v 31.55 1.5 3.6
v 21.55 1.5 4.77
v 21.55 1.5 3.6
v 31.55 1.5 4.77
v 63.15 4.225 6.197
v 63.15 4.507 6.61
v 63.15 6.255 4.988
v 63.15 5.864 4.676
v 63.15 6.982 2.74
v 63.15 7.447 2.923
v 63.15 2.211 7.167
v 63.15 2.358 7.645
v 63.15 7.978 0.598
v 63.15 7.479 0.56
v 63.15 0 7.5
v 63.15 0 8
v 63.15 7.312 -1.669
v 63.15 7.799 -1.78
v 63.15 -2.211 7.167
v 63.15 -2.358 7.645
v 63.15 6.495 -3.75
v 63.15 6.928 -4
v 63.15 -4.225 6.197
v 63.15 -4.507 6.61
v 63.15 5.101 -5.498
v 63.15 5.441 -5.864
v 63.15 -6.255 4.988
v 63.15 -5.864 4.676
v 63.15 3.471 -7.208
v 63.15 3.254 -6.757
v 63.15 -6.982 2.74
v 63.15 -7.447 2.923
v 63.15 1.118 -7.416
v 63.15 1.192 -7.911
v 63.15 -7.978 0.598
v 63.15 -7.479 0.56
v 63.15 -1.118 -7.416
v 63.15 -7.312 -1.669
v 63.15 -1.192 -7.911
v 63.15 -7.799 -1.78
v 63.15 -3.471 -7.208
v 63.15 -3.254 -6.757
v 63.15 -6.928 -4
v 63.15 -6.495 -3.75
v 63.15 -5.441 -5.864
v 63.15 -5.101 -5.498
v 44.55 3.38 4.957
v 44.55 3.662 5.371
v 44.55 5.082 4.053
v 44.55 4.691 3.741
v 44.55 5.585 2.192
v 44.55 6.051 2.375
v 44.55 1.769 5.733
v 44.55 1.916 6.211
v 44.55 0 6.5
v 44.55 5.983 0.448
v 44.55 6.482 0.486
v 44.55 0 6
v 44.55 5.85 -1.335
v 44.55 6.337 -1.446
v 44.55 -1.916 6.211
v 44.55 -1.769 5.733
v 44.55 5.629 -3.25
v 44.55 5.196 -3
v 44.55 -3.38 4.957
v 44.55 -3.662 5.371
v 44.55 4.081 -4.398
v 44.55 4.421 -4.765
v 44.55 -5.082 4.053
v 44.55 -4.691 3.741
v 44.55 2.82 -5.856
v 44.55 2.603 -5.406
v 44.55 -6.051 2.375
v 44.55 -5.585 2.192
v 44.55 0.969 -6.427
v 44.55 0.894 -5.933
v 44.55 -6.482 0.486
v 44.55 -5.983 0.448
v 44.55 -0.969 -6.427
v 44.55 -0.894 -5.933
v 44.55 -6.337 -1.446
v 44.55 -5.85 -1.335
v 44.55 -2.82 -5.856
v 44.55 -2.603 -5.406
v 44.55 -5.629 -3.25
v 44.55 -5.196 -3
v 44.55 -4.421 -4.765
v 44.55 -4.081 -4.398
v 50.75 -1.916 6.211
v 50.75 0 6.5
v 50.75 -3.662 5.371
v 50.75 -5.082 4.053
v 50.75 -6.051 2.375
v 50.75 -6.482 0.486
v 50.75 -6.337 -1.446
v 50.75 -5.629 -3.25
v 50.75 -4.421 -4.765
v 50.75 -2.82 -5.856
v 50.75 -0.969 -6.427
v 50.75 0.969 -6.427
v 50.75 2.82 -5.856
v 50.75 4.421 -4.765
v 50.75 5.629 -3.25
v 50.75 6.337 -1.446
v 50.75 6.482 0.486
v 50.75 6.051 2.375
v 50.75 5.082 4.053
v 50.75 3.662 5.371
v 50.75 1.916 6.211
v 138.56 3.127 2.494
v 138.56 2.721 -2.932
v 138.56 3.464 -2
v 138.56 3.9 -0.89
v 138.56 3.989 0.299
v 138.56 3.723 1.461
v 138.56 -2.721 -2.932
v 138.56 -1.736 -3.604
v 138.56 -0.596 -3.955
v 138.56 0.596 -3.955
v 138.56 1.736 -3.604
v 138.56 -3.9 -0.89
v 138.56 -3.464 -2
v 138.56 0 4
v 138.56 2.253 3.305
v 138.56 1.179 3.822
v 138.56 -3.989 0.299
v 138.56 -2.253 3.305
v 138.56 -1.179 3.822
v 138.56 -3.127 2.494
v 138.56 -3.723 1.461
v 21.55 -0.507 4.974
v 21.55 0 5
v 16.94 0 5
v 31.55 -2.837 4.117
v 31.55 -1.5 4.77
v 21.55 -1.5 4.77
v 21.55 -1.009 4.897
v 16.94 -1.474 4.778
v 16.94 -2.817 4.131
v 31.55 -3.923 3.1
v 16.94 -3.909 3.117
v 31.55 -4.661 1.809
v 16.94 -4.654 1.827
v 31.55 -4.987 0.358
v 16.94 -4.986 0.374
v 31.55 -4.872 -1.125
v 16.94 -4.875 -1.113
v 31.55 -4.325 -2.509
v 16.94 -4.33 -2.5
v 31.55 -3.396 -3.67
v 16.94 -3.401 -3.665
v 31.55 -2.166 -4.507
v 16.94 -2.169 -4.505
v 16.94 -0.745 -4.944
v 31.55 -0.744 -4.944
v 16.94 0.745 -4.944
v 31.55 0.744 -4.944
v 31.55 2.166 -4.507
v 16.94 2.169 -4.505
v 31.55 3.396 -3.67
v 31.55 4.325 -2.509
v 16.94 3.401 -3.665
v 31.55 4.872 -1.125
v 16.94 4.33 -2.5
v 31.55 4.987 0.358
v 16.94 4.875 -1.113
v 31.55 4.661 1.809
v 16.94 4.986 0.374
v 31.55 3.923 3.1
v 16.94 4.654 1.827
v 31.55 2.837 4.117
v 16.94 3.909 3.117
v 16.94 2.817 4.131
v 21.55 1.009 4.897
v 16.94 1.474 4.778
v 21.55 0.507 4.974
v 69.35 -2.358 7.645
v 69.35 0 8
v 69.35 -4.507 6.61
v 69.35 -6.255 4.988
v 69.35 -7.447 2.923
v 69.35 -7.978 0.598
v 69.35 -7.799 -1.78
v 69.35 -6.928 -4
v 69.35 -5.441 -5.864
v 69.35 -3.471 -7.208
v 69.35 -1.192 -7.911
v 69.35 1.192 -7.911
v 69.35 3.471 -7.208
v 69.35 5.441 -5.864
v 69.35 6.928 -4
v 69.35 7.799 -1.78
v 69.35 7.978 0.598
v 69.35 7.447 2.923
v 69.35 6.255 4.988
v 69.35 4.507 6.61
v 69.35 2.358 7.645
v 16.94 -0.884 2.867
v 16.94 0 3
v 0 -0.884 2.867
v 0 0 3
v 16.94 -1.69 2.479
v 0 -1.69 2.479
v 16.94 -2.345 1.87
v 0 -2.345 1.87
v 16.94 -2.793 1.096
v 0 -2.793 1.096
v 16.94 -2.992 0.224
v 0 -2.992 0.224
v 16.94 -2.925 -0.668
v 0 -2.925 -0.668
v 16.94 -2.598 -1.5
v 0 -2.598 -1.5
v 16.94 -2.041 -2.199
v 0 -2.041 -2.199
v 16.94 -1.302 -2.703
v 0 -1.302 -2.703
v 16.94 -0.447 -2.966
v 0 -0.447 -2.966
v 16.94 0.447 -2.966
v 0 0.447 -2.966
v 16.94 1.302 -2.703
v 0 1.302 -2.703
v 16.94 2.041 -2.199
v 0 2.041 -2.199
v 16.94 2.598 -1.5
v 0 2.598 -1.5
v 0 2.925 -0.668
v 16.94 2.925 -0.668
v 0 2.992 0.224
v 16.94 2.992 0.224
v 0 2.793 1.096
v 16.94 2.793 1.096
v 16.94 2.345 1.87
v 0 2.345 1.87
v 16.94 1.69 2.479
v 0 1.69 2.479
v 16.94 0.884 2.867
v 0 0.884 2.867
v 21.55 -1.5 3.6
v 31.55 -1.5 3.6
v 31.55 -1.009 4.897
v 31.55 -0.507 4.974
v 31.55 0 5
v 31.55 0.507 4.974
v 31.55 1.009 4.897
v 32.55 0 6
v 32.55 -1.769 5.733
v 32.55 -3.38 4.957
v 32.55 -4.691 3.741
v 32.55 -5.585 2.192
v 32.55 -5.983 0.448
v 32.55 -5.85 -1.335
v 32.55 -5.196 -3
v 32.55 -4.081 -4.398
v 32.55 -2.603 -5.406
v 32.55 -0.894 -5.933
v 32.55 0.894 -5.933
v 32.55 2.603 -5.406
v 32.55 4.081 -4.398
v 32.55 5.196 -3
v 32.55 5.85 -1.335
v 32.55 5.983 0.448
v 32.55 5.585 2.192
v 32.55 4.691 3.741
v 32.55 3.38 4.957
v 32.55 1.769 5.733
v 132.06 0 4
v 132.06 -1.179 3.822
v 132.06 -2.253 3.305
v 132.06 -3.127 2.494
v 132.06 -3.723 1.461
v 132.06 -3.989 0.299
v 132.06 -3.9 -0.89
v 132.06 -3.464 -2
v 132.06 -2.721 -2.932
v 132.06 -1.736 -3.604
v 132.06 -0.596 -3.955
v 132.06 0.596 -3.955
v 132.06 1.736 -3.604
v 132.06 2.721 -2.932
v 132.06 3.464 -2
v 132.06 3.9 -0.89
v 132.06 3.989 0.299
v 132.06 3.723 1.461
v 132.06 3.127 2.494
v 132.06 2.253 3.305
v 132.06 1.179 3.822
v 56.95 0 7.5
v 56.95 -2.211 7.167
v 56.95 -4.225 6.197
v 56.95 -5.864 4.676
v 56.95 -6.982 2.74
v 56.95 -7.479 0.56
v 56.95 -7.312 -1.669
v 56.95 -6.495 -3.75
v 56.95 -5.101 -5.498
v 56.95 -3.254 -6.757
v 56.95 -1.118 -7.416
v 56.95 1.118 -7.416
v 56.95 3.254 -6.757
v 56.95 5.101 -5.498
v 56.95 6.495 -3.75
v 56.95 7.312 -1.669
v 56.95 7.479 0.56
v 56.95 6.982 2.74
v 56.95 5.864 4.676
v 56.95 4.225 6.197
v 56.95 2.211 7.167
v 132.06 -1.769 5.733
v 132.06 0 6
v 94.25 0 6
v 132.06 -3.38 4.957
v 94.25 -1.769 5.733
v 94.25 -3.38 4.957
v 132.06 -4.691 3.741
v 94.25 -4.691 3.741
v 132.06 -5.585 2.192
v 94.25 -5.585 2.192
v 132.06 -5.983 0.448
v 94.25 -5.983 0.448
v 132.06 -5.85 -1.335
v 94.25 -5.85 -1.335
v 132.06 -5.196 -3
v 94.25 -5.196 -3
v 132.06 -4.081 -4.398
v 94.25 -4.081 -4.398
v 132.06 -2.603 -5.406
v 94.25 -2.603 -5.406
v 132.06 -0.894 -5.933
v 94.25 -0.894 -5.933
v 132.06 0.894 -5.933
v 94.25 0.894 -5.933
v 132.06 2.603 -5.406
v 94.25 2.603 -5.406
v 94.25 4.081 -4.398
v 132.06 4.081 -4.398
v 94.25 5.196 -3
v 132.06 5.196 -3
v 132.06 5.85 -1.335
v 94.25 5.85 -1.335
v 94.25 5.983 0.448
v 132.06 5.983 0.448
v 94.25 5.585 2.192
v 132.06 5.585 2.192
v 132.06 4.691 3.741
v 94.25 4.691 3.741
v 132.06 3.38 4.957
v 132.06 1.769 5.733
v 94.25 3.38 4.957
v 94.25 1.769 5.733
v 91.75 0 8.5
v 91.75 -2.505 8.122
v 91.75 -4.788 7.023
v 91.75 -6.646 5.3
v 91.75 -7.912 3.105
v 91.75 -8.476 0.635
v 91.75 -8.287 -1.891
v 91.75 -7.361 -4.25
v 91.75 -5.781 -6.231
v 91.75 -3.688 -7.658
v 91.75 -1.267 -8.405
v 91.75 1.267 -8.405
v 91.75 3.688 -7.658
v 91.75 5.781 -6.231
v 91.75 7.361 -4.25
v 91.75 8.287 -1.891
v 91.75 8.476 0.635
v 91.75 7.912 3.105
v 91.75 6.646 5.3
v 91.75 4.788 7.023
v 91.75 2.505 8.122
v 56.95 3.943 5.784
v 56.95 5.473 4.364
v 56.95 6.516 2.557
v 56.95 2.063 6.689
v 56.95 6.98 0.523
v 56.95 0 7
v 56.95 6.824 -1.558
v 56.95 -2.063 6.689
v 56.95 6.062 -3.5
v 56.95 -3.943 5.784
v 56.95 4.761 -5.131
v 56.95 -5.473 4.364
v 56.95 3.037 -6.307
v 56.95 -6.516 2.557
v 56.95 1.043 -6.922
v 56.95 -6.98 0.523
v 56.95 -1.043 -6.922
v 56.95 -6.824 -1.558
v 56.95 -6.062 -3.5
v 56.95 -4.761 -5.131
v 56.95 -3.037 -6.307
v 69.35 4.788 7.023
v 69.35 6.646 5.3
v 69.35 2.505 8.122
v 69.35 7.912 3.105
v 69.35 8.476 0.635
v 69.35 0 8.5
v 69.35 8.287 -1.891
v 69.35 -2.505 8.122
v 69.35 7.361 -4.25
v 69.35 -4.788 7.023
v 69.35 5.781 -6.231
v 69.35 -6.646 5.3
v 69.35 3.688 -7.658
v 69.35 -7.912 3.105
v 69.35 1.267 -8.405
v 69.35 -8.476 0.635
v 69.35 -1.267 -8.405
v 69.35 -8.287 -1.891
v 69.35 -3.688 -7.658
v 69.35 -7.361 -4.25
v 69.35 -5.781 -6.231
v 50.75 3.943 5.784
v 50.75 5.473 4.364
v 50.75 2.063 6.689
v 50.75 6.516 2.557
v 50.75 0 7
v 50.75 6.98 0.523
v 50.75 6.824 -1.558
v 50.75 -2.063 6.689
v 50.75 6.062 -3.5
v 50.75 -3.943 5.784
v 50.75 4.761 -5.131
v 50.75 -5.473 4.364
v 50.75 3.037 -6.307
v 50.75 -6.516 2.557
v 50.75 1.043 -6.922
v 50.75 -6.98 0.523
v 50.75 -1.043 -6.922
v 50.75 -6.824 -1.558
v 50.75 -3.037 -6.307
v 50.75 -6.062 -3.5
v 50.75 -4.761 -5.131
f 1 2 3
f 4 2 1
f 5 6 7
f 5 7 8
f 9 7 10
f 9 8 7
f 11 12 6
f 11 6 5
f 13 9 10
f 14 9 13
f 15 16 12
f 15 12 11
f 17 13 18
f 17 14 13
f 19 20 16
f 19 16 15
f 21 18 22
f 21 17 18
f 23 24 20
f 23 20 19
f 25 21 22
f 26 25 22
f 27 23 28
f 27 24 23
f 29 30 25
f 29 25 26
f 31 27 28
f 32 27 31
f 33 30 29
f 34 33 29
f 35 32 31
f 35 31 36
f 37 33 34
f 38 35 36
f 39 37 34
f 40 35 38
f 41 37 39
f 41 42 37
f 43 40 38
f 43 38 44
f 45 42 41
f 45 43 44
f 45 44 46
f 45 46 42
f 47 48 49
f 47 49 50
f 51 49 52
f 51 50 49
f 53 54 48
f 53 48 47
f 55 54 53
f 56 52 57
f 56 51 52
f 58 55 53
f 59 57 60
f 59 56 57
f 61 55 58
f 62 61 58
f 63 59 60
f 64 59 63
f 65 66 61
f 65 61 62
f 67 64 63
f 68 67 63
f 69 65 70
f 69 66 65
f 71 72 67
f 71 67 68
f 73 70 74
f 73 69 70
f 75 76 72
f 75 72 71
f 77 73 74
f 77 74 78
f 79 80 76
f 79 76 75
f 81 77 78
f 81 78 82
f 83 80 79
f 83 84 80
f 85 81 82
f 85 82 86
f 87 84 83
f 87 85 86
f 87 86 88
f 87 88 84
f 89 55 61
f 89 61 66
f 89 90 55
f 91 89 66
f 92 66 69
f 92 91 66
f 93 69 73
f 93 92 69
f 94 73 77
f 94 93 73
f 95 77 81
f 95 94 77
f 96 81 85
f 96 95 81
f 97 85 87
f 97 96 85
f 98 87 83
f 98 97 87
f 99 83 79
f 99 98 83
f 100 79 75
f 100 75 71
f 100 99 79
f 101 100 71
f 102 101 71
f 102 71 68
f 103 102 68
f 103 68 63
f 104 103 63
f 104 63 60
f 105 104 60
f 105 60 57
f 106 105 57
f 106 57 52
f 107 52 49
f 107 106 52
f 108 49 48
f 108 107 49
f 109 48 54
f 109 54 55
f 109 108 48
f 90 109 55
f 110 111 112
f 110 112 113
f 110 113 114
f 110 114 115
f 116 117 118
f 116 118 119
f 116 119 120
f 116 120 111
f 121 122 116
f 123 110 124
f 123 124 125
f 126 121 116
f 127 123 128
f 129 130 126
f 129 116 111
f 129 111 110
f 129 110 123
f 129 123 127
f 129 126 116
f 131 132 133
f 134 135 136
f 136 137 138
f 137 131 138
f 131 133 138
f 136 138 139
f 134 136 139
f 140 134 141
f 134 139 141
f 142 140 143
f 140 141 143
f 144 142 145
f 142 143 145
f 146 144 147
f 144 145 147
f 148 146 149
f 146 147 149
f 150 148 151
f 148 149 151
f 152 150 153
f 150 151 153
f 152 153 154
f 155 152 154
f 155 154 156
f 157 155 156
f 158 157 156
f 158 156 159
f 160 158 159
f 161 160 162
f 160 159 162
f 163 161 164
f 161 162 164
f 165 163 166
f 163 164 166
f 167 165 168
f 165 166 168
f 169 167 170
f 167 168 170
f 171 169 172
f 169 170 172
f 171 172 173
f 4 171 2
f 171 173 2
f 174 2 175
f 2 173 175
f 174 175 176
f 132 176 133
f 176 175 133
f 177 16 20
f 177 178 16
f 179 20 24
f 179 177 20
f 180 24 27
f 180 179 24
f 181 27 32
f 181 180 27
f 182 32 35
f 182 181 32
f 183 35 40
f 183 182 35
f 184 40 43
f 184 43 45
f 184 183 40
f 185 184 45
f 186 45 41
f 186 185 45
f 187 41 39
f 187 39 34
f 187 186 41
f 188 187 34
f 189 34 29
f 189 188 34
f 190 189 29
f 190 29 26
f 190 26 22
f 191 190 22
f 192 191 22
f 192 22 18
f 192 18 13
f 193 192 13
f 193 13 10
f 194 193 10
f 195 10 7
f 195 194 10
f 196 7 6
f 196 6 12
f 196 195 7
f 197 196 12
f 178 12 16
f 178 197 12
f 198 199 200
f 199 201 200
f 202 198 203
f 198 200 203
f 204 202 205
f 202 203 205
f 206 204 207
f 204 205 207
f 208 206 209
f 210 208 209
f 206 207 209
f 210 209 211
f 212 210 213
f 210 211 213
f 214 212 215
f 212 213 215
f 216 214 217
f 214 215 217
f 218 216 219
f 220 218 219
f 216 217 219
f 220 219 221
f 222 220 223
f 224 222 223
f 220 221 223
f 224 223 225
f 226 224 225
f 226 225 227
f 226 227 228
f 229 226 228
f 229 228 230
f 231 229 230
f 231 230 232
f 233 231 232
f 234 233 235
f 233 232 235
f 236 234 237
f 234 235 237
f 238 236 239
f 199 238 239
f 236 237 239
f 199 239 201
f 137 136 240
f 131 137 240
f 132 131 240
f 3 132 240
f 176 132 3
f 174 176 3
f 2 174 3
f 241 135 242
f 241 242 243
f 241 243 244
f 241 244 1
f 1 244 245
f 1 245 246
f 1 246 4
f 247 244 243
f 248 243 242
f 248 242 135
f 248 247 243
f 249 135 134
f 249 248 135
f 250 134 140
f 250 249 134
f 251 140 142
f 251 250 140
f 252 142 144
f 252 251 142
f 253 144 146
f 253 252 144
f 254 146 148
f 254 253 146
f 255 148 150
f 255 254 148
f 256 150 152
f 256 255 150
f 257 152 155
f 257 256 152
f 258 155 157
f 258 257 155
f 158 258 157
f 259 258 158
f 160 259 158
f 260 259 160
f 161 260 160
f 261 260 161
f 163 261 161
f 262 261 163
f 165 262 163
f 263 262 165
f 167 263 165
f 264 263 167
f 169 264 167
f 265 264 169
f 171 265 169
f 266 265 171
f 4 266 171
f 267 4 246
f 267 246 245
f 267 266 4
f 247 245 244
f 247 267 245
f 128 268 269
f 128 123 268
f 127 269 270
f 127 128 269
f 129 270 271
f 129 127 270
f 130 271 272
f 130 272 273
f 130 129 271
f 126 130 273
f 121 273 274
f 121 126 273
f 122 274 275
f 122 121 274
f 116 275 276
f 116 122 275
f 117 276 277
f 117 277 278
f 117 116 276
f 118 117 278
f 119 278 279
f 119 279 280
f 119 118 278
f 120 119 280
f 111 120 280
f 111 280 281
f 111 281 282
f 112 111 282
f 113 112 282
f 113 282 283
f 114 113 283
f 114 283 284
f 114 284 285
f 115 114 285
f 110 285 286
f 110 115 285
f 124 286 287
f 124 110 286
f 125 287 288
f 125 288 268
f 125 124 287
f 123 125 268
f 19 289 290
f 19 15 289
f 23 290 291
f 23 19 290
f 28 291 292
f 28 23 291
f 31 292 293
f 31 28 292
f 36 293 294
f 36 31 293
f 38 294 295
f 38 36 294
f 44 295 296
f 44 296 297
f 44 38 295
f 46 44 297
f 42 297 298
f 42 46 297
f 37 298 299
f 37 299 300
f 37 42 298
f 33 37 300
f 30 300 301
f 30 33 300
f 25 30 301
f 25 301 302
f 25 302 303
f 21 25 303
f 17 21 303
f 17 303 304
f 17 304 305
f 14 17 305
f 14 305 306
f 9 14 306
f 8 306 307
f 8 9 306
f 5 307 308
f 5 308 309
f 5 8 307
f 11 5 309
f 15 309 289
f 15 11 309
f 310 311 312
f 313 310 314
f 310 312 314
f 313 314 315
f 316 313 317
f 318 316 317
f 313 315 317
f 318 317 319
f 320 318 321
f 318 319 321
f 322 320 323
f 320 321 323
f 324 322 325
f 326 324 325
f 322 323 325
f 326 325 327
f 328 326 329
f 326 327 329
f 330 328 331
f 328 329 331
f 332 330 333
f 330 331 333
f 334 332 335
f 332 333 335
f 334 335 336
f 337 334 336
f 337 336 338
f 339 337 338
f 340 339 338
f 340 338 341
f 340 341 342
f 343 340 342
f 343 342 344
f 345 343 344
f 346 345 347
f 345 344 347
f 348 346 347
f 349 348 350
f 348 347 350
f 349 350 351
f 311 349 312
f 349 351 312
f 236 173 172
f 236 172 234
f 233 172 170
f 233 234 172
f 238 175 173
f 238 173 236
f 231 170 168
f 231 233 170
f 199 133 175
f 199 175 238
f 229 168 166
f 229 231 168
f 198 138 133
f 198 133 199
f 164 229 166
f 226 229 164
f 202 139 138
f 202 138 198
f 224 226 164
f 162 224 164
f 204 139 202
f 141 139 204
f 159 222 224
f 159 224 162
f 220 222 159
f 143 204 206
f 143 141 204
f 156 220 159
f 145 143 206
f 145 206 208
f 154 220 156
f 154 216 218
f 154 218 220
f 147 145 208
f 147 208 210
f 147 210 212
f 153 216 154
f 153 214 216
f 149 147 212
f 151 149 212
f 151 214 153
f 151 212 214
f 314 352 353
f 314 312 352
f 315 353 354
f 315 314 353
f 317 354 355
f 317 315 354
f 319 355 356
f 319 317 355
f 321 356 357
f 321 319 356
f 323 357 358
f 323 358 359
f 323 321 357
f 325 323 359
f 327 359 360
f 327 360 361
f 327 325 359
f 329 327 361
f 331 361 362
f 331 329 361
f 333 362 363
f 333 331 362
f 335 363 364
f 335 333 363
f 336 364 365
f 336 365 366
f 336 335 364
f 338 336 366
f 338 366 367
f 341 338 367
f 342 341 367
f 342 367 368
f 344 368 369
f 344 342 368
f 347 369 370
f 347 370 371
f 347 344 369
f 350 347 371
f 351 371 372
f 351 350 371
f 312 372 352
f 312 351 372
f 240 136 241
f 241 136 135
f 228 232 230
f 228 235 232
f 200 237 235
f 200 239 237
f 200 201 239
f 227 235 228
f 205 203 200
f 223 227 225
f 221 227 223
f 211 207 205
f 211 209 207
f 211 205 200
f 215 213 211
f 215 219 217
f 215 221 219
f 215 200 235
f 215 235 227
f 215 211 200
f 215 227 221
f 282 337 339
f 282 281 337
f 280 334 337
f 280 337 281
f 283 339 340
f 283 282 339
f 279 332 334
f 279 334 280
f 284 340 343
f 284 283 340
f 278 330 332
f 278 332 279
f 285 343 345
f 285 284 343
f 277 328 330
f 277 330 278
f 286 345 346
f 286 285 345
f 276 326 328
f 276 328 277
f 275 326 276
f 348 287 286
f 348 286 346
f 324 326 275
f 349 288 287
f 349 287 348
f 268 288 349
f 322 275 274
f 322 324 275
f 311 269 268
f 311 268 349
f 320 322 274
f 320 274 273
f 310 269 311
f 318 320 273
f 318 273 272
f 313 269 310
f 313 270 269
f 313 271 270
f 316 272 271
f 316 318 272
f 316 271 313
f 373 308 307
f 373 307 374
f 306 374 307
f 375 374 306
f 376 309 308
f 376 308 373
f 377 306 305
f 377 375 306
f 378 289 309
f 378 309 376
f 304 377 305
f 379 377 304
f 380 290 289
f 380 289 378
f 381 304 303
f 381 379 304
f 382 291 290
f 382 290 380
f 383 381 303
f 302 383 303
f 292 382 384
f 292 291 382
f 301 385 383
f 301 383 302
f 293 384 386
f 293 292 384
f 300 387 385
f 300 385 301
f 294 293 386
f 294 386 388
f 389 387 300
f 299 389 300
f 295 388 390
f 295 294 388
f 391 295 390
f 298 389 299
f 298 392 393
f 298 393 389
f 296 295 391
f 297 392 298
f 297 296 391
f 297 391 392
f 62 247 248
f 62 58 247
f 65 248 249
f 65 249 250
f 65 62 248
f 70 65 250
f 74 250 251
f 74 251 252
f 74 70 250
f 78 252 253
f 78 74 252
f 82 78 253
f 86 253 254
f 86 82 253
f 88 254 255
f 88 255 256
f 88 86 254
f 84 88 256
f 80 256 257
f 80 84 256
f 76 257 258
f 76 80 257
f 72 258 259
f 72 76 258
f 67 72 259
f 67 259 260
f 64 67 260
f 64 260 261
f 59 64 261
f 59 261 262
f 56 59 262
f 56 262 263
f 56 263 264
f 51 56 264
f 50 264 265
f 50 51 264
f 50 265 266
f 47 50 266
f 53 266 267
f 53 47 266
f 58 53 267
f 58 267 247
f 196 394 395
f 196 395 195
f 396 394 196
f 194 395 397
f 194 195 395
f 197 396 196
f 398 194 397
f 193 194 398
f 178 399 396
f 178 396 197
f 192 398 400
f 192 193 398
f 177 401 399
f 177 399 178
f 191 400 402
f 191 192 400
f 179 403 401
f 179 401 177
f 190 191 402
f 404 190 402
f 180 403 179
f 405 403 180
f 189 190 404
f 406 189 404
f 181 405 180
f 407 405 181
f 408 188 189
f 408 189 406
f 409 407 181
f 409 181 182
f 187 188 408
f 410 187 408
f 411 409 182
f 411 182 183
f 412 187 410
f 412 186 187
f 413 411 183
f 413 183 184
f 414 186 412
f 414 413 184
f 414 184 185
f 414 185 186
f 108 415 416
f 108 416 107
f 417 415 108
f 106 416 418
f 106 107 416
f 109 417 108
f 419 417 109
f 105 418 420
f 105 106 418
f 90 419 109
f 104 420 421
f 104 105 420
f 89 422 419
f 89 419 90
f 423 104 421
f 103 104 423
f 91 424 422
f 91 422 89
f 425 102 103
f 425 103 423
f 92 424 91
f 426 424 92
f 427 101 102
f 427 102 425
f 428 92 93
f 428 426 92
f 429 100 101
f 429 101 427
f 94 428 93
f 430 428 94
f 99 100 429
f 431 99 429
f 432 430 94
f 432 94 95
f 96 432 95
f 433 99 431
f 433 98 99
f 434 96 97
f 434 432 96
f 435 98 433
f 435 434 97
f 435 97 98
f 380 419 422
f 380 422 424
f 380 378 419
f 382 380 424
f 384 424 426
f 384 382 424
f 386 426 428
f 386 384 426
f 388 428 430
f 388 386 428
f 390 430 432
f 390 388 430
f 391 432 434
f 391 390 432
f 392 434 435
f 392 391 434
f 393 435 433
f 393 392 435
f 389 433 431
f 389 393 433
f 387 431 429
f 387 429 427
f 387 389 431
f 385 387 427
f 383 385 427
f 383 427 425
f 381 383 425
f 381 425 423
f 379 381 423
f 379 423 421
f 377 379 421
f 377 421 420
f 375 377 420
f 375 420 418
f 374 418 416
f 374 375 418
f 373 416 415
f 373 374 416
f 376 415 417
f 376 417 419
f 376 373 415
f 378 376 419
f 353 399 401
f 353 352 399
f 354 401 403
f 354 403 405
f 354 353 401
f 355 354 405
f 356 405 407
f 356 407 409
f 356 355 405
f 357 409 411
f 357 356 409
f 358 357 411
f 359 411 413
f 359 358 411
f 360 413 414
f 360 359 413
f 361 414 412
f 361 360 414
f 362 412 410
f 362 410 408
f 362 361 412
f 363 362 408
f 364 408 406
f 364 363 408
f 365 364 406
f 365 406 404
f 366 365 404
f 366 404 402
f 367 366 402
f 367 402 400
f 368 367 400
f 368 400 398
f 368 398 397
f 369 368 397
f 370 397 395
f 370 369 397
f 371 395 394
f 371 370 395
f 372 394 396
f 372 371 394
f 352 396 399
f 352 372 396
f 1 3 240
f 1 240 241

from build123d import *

# Parameters (mm, degrees)
CUT_EXTRUDE1_START = 2
SKETCH2_W          = 10
SKETCH2_H          = 3
CUT_EXTRUDE1_DEPTH = 1.4


with BuildPart() as part:
    # Sketch1 → Revolve1 (revolve)
    with BuildSketch(Plane.XY, mode=Mode.PRIVATE) as revolve1_sk:
        Polygon((0, 0), (0, 3), (6.5, 3), (16.94, 3), (16.94, 5), (21.87, 5), (31.55, 5), (32.55, 6), (44.55, 6), (44.55, 6.5), (50.75, 6.5), (50.75, 7), (56.95, 7), (56.95, 7.5), (63.15, 7.5), (63.15, 8), (69.35, 8), (69.35, 8.5), (91.75, 8.5), (94.25, 6), (120.06, 6), (132.06, 6), (132.06, 4), (138.56, 4), (138.56, 0), align=None)
    revolve(revolve1_sk.sketch.rotate(Axis((0, 0, 0), (1, 0, 0)), 90), axis=Axis((0, 0, 0), (1, 0, 0)))

    # Sketch2 → Cut-Extrude1 (cut)
    with BuildSketch(Plane.XY.offset(3).offset(CUT_EXTRUDE1_START)):
        with Locations((26.55, 0)):
            Rectangle(SKETCH2_W, SKETCH2_H)
    extrude(amount=-CUT_EXTRUDE1_DEPTH, mode=Mode.SUBTRACT)


solid = part.part
